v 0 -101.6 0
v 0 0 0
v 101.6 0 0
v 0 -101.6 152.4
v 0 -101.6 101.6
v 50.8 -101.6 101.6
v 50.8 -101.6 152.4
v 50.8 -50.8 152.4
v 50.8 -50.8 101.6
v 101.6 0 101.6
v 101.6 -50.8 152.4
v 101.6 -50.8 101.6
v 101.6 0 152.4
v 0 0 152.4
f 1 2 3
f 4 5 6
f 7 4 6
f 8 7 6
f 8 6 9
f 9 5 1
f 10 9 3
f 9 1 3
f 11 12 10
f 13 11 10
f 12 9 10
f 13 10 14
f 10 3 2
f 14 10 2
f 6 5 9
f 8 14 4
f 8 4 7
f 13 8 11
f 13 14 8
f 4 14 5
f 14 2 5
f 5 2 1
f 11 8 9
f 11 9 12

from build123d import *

# Parameters (mm, degrees)
F1_DEPTH = 101.6
F3_DEPTH = 50.8
F4_W     = 50.8
F4_H     = 50.8
F5_DEPTH = 152.401


with BuildPart() as f1:
    # F0 (on Top) → F1 (new body)
    with BuildSketch(Plane.XY):
        Polygon((101.6, 0), (0, 0), (0, -101.6), align=None)
    extrude(amount=F1_DEPTH)

    # F2 (on face) → F3 (join)
    with BuildSketch(Plane.XY.offset(101.6)):
        Polygon((101.6, 0), (0, 0), (0, -101.6), align=None)
        Polygon((101.6, -101.6), (101.6, 0), (0, -101.6), align=None)
    extrude(amount=F3_DEPTH)

    # F4 (on face) → F5 (cut, through all)
    with BuildSketch(Plane.XY.offset(152.4)):
        with Locations((76.2, -76.2)):
            Rectangle(F4_W, F4_H)
    extrude(amount=-F5_DEPTH, mode=Mode.SUBTRACT)


solid = f1.part
